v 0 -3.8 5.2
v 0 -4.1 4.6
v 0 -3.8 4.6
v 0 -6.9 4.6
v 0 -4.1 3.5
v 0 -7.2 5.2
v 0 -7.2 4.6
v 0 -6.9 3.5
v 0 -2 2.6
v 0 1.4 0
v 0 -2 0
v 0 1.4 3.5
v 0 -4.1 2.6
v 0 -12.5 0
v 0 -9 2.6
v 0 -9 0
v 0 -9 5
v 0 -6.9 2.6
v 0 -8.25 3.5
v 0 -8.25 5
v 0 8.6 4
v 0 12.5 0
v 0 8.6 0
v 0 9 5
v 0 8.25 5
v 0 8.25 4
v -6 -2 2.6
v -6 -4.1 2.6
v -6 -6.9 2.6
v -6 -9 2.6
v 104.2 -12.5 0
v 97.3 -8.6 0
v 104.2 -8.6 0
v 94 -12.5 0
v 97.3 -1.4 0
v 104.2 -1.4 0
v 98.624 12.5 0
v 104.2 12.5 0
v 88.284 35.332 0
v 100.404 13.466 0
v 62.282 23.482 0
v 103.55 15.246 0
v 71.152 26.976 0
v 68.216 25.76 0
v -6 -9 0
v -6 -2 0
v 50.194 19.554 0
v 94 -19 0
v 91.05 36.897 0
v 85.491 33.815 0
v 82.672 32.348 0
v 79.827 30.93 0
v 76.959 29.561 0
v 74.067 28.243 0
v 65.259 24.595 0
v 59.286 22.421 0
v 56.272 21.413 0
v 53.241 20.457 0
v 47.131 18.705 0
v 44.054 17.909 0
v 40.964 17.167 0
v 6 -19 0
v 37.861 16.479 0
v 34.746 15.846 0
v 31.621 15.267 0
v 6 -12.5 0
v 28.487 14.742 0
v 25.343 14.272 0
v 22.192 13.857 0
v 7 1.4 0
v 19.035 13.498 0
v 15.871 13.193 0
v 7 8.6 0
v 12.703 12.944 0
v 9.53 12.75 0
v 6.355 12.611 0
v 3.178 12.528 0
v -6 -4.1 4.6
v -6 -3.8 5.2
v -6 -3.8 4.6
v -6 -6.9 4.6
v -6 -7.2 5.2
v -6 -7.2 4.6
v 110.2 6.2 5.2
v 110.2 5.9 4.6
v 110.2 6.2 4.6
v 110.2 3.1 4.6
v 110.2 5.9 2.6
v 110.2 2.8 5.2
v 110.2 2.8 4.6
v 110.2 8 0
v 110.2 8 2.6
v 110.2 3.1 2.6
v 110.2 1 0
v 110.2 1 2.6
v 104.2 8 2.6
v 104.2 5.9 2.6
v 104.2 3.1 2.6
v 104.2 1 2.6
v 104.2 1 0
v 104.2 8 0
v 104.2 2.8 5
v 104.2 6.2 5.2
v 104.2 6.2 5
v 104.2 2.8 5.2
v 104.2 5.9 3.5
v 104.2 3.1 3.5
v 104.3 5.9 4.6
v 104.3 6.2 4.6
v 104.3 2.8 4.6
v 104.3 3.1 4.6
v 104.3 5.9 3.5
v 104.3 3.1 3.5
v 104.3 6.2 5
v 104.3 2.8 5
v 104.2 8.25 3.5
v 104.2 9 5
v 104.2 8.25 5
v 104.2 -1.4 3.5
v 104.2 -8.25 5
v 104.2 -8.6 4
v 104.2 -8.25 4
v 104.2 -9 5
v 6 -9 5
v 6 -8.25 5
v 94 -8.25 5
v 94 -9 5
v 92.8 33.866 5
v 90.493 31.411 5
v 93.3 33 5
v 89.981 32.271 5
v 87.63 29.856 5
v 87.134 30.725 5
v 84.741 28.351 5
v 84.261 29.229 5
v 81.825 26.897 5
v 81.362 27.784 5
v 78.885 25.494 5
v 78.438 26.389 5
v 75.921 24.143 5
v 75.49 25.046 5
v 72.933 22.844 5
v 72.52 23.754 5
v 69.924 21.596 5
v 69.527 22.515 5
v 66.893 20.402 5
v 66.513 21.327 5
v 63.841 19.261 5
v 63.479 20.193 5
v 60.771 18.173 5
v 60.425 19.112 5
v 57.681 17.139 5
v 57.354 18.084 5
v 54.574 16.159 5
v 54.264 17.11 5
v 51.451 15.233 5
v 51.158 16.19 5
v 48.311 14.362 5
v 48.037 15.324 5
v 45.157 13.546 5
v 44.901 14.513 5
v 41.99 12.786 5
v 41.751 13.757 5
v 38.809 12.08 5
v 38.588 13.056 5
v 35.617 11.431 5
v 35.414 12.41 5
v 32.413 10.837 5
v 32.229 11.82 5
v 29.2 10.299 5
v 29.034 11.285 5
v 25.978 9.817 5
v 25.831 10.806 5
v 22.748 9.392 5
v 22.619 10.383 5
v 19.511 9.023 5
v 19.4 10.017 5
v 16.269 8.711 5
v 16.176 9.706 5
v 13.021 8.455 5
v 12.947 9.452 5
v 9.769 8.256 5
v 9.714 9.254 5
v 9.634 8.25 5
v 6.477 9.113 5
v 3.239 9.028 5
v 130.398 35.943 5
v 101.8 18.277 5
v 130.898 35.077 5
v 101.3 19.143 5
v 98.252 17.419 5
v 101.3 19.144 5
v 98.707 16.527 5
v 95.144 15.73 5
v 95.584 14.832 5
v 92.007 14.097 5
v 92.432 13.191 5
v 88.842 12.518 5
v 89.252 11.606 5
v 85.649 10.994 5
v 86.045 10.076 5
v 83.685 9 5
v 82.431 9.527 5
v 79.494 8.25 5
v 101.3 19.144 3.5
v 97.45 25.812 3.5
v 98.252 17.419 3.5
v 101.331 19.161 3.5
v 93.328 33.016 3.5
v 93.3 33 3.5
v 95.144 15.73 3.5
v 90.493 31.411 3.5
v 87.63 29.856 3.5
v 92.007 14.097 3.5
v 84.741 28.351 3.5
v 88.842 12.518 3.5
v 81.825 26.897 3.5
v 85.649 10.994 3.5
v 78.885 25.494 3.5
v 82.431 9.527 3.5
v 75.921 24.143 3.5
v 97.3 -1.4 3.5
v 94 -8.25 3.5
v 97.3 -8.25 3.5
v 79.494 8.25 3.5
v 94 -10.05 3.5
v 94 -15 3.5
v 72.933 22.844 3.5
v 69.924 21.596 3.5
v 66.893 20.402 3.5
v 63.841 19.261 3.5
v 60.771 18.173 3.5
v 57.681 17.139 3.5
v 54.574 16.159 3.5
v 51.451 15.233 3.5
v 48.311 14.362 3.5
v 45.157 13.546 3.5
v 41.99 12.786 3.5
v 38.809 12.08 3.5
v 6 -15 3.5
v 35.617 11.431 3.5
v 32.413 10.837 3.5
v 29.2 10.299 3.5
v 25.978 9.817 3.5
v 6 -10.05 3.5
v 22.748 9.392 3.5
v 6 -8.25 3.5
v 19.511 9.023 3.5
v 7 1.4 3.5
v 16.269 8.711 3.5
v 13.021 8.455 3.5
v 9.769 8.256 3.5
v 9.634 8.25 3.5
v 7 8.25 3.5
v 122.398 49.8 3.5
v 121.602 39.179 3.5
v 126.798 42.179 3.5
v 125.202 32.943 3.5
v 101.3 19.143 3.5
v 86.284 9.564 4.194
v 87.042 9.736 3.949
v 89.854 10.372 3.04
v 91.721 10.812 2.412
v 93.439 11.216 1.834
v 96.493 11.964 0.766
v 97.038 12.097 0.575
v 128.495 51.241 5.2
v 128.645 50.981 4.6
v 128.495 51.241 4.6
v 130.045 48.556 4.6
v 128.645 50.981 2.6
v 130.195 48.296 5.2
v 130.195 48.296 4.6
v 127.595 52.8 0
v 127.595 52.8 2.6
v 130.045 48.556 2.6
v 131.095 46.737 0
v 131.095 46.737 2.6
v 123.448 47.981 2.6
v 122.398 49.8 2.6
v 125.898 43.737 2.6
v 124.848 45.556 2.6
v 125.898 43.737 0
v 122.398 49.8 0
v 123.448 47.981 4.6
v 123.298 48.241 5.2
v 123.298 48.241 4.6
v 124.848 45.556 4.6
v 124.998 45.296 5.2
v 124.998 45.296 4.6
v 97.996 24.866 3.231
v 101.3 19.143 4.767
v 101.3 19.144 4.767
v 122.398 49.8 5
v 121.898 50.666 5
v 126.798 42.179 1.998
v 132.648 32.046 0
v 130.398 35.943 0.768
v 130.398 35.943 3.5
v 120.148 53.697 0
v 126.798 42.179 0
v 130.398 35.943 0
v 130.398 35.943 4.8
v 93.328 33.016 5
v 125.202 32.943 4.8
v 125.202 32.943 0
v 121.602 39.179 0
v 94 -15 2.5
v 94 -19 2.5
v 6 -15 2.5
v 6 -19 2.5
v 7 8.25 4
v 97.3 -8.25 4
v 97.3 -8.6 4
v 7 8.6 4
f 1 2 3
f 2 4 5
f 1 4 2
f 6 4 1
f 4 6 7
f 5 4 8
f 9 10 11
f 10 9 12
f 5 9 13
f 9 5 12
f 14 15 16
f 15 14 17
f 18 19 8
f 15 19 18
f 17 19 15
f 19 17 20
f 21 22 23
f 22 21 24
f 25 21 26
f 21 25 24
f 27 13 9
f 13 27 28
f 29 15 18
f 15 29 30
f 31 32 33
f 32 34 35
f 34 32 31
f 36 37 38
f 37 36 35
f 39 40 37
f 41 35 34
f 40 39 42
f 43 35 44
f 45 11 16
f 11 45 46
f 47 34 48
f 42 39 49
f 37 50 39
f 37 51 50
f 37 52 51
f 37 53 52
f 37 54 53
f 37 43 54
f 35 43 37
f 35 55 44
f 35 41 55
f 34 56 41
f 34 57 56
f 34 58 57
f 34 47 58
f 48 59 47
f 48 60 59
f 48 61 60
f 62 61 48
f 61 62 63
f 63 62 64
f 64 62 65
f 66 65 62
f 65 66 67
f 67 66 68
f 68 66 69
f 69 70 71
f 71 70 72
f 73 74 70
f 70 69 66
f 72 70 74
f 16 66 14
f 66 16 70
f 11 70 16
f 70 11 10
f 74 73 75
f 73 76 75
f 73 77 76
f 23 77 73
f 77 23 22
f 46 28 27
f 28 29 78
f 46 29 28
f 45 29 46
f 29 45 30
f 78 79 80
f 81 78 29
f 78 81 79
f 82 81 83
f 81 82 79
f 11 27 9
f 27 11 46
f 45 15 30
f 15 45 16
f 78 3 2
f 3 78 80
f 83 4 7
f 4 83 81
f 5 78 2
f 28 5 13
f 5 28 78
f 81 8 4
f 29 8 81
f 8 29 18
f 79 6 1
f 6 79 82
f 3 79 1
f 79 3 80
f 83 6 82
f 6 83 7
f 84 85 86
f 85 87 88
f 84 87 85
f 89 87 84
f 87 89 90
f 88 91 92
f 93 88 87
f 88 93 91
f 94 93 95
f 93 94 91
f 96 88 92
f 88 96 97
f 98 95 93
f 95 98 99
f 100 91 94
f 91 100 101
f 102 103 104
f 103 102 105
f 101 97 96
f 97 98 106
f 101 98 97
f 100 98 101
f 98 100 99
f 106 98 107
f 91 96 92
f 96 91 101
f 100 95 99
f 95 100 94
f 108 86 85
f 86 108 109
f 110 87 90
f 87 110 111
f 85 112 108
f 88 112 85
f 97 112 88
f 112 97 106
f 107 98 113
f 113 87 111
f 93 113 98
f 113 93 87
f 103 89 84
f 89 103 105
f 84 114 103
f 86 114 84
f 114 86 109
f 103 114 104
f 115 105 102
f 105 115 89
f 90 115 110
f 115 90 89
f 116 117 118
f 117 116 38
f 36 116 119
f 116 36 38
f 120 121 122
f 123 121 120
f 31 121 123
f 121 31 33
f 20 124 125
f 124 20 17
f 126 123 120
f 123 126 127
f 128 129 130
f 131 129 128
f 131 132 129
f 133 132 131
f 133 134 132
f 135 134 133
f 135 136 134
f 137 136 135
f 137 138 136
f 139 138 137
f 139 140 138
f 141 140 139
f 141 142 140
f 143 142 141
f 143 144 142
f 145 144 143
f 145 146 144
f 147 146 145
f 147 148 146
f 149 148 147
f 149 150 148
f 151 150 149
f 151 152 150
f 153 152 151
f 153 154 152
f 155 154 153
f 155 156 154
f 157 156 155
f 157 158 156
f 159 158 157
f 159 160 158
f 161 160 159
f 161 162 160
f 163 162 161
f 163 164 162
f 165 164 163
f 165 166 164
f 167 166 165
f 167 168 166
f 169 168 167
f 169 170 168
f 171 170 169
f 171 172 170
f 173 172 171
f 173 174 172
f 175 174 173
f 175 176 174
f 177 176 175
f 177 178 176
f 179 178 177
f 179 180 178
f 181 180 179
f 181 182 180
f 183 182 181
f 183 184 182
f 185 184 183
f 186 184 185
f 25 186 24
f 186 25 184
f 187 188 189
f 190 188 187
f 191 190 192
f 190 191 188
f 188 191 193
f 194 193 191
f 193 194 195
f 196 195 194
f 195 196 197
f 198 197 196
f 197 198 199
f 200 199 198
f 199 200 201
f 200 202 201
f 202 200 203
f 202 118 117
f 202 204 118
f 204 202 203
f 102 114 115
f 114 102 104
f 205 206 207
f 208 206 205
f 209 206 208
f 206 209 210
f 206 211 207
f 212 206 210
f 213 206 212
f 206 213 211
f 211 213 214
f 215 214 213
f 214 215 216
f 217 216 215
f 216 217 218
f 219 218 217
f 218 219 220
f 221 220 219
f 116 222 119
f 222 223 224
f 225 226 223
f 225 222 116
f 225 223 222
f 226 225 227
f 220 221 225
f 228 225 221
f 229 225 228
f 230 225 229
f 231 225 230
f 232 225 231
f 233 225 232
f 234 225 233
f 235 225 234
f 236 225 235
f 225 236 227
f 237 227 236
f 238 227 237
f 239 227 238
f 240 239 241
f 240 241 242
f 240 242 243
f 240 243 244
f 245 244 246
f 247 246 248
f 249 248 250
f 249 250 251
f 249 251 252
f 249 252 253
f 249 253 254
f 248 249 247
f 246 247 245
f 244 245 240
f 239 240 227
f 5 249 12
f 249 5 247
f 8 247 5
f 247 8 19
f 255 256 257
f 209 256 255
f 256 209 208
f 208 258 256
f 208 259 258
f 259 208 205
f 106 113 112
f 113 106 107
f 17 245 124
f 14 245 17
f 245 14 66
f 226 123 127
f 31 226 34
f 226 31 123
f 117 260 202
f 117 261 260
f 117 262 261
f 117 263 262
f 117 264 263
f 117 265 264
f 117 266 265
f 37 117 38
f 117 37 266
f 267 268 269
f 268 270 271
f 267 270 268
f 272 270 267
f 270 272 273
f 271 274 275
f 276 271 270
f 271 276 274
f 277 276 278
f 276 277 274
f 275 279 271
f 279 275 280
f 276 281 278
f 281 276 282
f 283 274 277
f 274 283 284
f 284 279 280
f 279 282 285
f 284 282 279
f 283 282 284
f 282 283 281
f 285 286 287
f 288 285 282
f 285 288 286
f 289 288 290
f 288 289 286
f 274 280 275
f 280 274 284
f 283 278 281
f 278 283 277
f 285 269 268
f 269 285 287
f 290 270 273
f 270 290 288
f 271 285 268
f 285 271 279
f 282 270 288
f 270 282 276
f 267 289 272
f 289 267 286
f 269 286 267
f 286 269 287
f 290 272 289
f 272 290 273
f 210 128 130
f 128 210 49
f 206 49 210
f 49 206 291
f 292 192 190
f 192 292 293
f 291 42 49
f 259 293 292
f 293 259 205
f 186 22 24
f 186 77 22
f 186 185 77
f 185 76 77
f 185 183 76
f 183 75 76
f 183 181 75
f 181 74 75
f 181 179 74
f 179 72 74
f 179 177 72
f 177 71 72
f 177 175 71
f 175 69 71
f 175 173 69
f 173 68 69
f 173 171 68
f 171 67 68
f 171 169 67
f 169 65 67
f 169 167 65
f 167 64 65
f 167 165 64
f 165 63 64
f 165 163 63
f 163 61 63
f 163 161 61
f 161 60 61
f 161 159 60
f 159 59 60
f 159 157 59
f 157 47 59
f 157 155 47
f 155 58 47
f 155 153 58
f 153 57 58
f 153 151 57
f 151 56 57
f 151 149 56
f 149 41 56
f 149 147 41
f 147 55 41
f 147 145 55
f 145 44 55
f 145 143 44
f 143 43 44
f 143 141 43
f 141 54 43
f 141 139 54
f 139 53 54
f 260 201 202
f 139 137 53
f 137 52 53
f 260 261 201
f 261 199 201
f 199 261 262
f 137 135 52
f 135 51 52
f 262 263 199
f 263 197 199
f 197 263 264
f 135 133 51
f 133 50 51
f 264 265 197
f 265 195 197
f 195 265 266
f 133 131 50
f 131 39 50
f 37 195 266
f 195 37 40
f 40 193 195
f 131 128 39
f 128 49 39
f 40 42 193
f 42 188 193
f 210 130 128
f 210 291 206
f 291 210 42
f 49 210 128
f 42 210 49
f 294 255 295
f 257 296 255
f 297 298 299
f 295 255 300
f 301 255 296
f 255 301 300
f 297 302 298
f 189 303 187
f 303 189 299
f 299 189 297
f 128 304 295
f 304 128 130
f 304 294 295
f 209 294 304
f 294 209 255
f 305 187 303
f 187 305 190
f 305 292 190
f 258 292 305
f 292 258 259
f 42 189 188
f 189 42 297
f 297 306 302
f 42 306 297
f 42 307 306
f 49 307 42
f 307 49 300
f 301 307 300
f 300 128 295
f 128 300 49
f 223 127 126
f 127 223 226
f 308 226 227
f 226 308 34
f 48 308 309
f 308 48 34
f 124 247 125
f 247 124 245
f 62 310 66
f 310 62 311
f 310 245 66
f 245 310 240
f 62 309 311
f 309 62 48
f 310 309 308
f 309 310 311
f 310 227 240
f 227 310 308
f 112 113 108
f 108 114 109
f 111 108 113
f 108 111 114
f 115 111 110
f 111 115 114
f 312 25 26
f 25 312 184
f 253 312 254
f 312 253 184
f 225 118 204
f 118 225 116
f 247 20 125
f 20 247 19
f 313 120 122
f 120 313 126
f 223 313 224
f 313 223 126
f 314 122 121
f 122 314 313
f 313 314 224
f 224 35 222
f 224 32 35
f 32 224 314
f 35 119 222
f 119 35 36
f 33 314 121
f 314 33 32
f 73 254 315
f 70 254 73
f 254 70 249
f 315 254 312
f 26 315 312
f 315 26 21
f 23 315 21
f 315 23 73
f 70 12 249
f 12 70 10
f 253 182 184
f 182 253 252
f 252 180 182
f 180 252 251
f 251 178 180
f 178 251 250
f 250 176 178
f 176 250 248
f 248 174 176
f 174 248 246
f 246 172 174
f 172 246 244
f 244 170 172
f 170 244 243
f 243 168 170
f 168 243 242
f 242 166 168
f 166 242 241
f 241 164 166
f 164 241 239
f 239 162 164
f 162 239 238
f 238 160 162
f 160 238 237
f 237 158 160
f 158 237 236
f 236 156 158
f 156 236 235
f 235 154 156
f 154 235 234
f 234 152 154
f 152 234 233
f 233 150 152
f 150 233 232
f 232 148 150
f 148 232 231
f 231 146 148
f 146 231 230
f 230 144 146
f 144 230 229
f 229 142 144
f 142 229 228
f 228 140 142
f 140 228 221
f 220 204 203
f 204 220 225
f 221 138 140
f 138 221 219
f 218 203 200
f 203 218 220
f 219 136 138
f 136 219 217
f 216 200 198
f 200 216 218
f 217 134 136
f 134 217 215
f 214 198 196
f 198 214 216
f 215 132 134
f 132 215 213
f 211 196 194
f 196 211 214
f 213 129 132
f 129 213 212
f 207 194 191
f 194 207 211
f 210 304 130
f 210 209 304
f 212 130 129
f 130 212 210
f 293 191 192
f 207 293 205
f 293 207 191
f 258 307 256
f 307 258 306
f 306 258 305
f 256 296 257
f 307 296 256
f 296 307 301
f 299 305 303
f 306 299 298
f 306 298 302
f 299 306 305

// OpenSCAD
// file: Kato.scad
breite_oben = 18.0;  
breite_unten = 25.0;
hoehe_basis = 5.0;   

ausschnitt_tiefe = 1.5;
unijoiner_tiefe = 6;
unijoiner_breite = 7;

module bett_profil() {
    polygon(points=[
        [-breite_unten/2, 0],     // unten links
        [breite_unten/2, 0],      // unten rechts
        [breite_oben/2, hoehe_basis],   // oben rechts
        [-breite_oben/2, hoehe_basis]   // oben links
    ]);
}

module ausschnitt_profil() {
  breite = breite_oben - 2;
    polygon(points=[
        [-breite / 2, hoehe_basis - ausschnitt_tiefe],     // unten links
        [breite / 2, hoehe_basis - ausschnitt_tiefe],      // unten rechts
        [breite / 2, hoehe_basis + 1],   // oben rechts
        [-breite / 2, hoehe_basis + 1]   // oben links
    ]);
}

module gesamt_profil() {
    difference() {
        bett_profil();
        ausschnitt_profil();
    } 
        
}

module bogen_bett(r, w) {
    // Erzeugt das gebogene Bett durch Extrusion entlang eines Pfades   
  rotate_extrude(angle = w, $fn = 360) 
    translate([r,0, 0]) 
        bett_profil();
}

module bogen_ausschnitt(r, w) {
  // Erzeugt das gebogene Bett durch Extrusion entlang eines Pfades
  rotate_extrude(angle = w+0.01, $fn = 360) 
    translate([r,0, 0]) 
        ausschnitt_profil();
}

module strecke(l) {
   rotate(a=[90,0,90])
    linear_extrude(height= l)
        gesamt_profil();
}

module strecke_bett(l) {
   rotate(a=[90,0,90])
    linear_extrude(height= l)
        bett_profil();
}

module strecke_ausschnitt(l) {
   rotate(a=[90,0,90])
    linear_extrude(height= l)
       gesamt_profil();
            ausschnitt_profil();
}
// main file
// Varianten
// Nur Weiche Roco 2417
// Mit Roco 2419 R1 Ausgleichsstück 6° 
// Mit Roco 2413 Ausgleichsstück 33.6 mm


// Length of turnout (straight part, 104.2mm on Roco 2417)
laenge = 104.2;      

// Endwinkel des Abzweigs (mit 2419 R1 Ausgleichsstück 6° =30, sonst =24 bei Roco 2417)
winkel = 30;         // 

// Radius des Abzweigs
radius = 194.6;   // [194.6, 228.2, 261.8, 295.4, 329.0, 362.6, 480]

// Länge des am Abzweig befindlichen geraden Stücks (33.6 für Roco 2413)
anschluss_gerade_laenge = 33.6;

// Length of drive platform
drive_length = 88; // 88 Für Weichenantrieb bei Roco 2417

// Width of drive platform
drive_width = 10.0;

// Offset of drive platform from entry
drive_offset = 6;

drive_inset = 4;

enable_entrance_unijoiner = true;

enable_exit_unijoiner = true;

module endofparms() {
    
}

include <Kato.scad>;




module drive_box() {
        inset_height = 1;
        difference() {
            cube([drive_length, drive_width, hoehe_basis]);
            if (drive_inset > 0) {
                translate([0,0,hoehe_basis-ausschnitt_tiefe-inset_height])
                    cube([drive_length, drive_inset, inset_height]);
            }
        }
}

module drive_cut() {
    // Width plus one to eliminate the rim of the bed
    cube([drive_length, drive_width + 1, hoehe_basis]);
}

module unijoiner_receptable() {

    translate([0.0, 1.4, 0.0]) 
        cube([unijoiner_tiefe + 1, unijoiner_breite + 0.2, hoehe_basis-1]); 
}

module unijoiner_plug() {
    width_bottom = unijoiner_breite;
    width_middle = 2.8;
    height_bottom = 2.6;
    height_middle = 4.6;

    width_top= width_middle + 0.6;
    height_top = 0.6;
    
    //width_groove = 1.2;
    //height_groove = 0.8;
    
    translate([0, breite_oben/4 - unijoiner_breite/2, 0])   
    difference() {
        union() {
            cube([unijoiner_tiefe, width_bottom, height_bottom]); 
            
            translate([0, width_bottom / 2 - width_middle / 2, 0])
                cube([unijoiner_tiefe, width_middle, height_middle]); 
  
            translate([0, width_bottom / 2 - width_top / 2, height_middle])
                cube([unijoiner_tiefe, width_top, height_top]); 
        }
 //       translate([0, width_bottom / 2 - width_groove / 2 , 4.0])
 //           cube([unijoiner_tiefe, width_groove, height_groove]); 
    }
}

module roco_2417_curved() {
    difference() {
        union() {

            // Einfahrt
            if (enable_entrance_unijoiner) {
                translate([-unijoiner_tiefe, -10, 0])
                    unijoiner_plug();
            }

            // 1. Gerader Strang            
            if (laenge > 0) {
                strecke(laenge);
                if (enable_exit_unijoiner) {
                    translate([laenge, 0, 0]) 
                        unijoiner_plug();
                }
            }
            
            // 2. Gebogener Abzweig
            
            if (winkel > 0) {
                // Versatz berechnen, damit der Bogen tangential am Nullpunkt startet
                translate([0, radius, 0])
                     rotate([0, 0, -90])
                        bogen_bett(radius, winkel);

                if (enable_exit_unijoiner) {
                    translate([cos(winkel)*anschluss_gerade_laenge, sin(winkel)*anschluss_gerade_laenge, 0])
                        translate([sin(winkel)*radius, radius - cos(winkel)*radius, 0])
                            rotate([0, 0, winkel])
                                unijoiner_plug();
                }
                
                 // Optionales gerades Stück am Ende des Bogens
                 if (anschluss_gerade_laenge > 0) {  
                    // 4. Anschlussgleis gerade 33,6mm (Roco 2413) 
                    translate([sin(winkel)*radius, radius - cos(winkel)*radius, 0])
                        rotate([0, 0, winkel])
                                strecke(anschluss_gerade_laenge);
                 }
                
            }
  
            // 3. Antriebsplattform
            if (drive_length > 0) {
                translate([drive_offset, - breite_oben / 2 - drive_width, 0]) 
                    drive_box();
            }
            
        }

        // --- SCHNITTE ---

        // Unijoiner Taschen
        if (enable_entrance_unijoiner) {
            unijoiner_receptable(); // Einfahrt
        }
            
        // Schwellenbett gerade (Aussparung)
        if (laenge > 0) {
            translate([0, -8.25, hoehe_basis - ausschnitt_tiefe])
                cube([laenge + 0.1, 16.5, ausschnitt_tiefe]);
            
            if (enable_exit_unijoiner) {
                translate([laenge - 6.9, -10, 0]) 
                    unijoiner_receptable(); // Ausgang Gerade
            }
        }

        // Schwellenbett gebogen (Aussparung)
        if (winkel > 0) {
            translate([0, radius, 0])
                rotate([0, 0, -90])
                    bogen_ausschnitt(radius, winkel);
        }

        // Antrieb (Aussparung)
        if (drive_length > 0) {
            translate([drive_offset, - breite_oben / 2 - drive_width - 0.2, hoehe_basis - ausschnitt_tiefe]) 
                    drive_cut();
        }
                
        
        if (winkel > 0) {
            if (enable_exit_unijoiner) {
                if (anschluss_gerade_laenge == 0) {
                    
                    // Ausgang Abzweig (Position am Ende des Bogens)
                    translate([sin(winkel)*radius, radius - cos(winkel)*radius, 0])
                        rotate([0, 0, winkel])
                            translate([-unijoiner_tiefe, -breite_oben/4 - unijoiner_breite/2, 0])
                                cube([7, unijoiner_breite + 0.2, 4.8]); 
                   
                } else {
                    translate([cos(winkel)*anschluss_gerade_laenge, sin(winkel)*anschluss_gerade_laenge, 0])
                        translate([sin(winkel)*radius, radius - cos(winkel)*radius, 0])
                            rotate([0, 0, winkel])
                                translate([-unijoiner_tiefe, -breite_oben/4 - unijoiner_breite/2, 0])
                                    cube([7, unijoiner_breite + 0.2, 4.8]); 
                    
                }
            }
        }
        
        
    }
}

roco_2417_curved();
